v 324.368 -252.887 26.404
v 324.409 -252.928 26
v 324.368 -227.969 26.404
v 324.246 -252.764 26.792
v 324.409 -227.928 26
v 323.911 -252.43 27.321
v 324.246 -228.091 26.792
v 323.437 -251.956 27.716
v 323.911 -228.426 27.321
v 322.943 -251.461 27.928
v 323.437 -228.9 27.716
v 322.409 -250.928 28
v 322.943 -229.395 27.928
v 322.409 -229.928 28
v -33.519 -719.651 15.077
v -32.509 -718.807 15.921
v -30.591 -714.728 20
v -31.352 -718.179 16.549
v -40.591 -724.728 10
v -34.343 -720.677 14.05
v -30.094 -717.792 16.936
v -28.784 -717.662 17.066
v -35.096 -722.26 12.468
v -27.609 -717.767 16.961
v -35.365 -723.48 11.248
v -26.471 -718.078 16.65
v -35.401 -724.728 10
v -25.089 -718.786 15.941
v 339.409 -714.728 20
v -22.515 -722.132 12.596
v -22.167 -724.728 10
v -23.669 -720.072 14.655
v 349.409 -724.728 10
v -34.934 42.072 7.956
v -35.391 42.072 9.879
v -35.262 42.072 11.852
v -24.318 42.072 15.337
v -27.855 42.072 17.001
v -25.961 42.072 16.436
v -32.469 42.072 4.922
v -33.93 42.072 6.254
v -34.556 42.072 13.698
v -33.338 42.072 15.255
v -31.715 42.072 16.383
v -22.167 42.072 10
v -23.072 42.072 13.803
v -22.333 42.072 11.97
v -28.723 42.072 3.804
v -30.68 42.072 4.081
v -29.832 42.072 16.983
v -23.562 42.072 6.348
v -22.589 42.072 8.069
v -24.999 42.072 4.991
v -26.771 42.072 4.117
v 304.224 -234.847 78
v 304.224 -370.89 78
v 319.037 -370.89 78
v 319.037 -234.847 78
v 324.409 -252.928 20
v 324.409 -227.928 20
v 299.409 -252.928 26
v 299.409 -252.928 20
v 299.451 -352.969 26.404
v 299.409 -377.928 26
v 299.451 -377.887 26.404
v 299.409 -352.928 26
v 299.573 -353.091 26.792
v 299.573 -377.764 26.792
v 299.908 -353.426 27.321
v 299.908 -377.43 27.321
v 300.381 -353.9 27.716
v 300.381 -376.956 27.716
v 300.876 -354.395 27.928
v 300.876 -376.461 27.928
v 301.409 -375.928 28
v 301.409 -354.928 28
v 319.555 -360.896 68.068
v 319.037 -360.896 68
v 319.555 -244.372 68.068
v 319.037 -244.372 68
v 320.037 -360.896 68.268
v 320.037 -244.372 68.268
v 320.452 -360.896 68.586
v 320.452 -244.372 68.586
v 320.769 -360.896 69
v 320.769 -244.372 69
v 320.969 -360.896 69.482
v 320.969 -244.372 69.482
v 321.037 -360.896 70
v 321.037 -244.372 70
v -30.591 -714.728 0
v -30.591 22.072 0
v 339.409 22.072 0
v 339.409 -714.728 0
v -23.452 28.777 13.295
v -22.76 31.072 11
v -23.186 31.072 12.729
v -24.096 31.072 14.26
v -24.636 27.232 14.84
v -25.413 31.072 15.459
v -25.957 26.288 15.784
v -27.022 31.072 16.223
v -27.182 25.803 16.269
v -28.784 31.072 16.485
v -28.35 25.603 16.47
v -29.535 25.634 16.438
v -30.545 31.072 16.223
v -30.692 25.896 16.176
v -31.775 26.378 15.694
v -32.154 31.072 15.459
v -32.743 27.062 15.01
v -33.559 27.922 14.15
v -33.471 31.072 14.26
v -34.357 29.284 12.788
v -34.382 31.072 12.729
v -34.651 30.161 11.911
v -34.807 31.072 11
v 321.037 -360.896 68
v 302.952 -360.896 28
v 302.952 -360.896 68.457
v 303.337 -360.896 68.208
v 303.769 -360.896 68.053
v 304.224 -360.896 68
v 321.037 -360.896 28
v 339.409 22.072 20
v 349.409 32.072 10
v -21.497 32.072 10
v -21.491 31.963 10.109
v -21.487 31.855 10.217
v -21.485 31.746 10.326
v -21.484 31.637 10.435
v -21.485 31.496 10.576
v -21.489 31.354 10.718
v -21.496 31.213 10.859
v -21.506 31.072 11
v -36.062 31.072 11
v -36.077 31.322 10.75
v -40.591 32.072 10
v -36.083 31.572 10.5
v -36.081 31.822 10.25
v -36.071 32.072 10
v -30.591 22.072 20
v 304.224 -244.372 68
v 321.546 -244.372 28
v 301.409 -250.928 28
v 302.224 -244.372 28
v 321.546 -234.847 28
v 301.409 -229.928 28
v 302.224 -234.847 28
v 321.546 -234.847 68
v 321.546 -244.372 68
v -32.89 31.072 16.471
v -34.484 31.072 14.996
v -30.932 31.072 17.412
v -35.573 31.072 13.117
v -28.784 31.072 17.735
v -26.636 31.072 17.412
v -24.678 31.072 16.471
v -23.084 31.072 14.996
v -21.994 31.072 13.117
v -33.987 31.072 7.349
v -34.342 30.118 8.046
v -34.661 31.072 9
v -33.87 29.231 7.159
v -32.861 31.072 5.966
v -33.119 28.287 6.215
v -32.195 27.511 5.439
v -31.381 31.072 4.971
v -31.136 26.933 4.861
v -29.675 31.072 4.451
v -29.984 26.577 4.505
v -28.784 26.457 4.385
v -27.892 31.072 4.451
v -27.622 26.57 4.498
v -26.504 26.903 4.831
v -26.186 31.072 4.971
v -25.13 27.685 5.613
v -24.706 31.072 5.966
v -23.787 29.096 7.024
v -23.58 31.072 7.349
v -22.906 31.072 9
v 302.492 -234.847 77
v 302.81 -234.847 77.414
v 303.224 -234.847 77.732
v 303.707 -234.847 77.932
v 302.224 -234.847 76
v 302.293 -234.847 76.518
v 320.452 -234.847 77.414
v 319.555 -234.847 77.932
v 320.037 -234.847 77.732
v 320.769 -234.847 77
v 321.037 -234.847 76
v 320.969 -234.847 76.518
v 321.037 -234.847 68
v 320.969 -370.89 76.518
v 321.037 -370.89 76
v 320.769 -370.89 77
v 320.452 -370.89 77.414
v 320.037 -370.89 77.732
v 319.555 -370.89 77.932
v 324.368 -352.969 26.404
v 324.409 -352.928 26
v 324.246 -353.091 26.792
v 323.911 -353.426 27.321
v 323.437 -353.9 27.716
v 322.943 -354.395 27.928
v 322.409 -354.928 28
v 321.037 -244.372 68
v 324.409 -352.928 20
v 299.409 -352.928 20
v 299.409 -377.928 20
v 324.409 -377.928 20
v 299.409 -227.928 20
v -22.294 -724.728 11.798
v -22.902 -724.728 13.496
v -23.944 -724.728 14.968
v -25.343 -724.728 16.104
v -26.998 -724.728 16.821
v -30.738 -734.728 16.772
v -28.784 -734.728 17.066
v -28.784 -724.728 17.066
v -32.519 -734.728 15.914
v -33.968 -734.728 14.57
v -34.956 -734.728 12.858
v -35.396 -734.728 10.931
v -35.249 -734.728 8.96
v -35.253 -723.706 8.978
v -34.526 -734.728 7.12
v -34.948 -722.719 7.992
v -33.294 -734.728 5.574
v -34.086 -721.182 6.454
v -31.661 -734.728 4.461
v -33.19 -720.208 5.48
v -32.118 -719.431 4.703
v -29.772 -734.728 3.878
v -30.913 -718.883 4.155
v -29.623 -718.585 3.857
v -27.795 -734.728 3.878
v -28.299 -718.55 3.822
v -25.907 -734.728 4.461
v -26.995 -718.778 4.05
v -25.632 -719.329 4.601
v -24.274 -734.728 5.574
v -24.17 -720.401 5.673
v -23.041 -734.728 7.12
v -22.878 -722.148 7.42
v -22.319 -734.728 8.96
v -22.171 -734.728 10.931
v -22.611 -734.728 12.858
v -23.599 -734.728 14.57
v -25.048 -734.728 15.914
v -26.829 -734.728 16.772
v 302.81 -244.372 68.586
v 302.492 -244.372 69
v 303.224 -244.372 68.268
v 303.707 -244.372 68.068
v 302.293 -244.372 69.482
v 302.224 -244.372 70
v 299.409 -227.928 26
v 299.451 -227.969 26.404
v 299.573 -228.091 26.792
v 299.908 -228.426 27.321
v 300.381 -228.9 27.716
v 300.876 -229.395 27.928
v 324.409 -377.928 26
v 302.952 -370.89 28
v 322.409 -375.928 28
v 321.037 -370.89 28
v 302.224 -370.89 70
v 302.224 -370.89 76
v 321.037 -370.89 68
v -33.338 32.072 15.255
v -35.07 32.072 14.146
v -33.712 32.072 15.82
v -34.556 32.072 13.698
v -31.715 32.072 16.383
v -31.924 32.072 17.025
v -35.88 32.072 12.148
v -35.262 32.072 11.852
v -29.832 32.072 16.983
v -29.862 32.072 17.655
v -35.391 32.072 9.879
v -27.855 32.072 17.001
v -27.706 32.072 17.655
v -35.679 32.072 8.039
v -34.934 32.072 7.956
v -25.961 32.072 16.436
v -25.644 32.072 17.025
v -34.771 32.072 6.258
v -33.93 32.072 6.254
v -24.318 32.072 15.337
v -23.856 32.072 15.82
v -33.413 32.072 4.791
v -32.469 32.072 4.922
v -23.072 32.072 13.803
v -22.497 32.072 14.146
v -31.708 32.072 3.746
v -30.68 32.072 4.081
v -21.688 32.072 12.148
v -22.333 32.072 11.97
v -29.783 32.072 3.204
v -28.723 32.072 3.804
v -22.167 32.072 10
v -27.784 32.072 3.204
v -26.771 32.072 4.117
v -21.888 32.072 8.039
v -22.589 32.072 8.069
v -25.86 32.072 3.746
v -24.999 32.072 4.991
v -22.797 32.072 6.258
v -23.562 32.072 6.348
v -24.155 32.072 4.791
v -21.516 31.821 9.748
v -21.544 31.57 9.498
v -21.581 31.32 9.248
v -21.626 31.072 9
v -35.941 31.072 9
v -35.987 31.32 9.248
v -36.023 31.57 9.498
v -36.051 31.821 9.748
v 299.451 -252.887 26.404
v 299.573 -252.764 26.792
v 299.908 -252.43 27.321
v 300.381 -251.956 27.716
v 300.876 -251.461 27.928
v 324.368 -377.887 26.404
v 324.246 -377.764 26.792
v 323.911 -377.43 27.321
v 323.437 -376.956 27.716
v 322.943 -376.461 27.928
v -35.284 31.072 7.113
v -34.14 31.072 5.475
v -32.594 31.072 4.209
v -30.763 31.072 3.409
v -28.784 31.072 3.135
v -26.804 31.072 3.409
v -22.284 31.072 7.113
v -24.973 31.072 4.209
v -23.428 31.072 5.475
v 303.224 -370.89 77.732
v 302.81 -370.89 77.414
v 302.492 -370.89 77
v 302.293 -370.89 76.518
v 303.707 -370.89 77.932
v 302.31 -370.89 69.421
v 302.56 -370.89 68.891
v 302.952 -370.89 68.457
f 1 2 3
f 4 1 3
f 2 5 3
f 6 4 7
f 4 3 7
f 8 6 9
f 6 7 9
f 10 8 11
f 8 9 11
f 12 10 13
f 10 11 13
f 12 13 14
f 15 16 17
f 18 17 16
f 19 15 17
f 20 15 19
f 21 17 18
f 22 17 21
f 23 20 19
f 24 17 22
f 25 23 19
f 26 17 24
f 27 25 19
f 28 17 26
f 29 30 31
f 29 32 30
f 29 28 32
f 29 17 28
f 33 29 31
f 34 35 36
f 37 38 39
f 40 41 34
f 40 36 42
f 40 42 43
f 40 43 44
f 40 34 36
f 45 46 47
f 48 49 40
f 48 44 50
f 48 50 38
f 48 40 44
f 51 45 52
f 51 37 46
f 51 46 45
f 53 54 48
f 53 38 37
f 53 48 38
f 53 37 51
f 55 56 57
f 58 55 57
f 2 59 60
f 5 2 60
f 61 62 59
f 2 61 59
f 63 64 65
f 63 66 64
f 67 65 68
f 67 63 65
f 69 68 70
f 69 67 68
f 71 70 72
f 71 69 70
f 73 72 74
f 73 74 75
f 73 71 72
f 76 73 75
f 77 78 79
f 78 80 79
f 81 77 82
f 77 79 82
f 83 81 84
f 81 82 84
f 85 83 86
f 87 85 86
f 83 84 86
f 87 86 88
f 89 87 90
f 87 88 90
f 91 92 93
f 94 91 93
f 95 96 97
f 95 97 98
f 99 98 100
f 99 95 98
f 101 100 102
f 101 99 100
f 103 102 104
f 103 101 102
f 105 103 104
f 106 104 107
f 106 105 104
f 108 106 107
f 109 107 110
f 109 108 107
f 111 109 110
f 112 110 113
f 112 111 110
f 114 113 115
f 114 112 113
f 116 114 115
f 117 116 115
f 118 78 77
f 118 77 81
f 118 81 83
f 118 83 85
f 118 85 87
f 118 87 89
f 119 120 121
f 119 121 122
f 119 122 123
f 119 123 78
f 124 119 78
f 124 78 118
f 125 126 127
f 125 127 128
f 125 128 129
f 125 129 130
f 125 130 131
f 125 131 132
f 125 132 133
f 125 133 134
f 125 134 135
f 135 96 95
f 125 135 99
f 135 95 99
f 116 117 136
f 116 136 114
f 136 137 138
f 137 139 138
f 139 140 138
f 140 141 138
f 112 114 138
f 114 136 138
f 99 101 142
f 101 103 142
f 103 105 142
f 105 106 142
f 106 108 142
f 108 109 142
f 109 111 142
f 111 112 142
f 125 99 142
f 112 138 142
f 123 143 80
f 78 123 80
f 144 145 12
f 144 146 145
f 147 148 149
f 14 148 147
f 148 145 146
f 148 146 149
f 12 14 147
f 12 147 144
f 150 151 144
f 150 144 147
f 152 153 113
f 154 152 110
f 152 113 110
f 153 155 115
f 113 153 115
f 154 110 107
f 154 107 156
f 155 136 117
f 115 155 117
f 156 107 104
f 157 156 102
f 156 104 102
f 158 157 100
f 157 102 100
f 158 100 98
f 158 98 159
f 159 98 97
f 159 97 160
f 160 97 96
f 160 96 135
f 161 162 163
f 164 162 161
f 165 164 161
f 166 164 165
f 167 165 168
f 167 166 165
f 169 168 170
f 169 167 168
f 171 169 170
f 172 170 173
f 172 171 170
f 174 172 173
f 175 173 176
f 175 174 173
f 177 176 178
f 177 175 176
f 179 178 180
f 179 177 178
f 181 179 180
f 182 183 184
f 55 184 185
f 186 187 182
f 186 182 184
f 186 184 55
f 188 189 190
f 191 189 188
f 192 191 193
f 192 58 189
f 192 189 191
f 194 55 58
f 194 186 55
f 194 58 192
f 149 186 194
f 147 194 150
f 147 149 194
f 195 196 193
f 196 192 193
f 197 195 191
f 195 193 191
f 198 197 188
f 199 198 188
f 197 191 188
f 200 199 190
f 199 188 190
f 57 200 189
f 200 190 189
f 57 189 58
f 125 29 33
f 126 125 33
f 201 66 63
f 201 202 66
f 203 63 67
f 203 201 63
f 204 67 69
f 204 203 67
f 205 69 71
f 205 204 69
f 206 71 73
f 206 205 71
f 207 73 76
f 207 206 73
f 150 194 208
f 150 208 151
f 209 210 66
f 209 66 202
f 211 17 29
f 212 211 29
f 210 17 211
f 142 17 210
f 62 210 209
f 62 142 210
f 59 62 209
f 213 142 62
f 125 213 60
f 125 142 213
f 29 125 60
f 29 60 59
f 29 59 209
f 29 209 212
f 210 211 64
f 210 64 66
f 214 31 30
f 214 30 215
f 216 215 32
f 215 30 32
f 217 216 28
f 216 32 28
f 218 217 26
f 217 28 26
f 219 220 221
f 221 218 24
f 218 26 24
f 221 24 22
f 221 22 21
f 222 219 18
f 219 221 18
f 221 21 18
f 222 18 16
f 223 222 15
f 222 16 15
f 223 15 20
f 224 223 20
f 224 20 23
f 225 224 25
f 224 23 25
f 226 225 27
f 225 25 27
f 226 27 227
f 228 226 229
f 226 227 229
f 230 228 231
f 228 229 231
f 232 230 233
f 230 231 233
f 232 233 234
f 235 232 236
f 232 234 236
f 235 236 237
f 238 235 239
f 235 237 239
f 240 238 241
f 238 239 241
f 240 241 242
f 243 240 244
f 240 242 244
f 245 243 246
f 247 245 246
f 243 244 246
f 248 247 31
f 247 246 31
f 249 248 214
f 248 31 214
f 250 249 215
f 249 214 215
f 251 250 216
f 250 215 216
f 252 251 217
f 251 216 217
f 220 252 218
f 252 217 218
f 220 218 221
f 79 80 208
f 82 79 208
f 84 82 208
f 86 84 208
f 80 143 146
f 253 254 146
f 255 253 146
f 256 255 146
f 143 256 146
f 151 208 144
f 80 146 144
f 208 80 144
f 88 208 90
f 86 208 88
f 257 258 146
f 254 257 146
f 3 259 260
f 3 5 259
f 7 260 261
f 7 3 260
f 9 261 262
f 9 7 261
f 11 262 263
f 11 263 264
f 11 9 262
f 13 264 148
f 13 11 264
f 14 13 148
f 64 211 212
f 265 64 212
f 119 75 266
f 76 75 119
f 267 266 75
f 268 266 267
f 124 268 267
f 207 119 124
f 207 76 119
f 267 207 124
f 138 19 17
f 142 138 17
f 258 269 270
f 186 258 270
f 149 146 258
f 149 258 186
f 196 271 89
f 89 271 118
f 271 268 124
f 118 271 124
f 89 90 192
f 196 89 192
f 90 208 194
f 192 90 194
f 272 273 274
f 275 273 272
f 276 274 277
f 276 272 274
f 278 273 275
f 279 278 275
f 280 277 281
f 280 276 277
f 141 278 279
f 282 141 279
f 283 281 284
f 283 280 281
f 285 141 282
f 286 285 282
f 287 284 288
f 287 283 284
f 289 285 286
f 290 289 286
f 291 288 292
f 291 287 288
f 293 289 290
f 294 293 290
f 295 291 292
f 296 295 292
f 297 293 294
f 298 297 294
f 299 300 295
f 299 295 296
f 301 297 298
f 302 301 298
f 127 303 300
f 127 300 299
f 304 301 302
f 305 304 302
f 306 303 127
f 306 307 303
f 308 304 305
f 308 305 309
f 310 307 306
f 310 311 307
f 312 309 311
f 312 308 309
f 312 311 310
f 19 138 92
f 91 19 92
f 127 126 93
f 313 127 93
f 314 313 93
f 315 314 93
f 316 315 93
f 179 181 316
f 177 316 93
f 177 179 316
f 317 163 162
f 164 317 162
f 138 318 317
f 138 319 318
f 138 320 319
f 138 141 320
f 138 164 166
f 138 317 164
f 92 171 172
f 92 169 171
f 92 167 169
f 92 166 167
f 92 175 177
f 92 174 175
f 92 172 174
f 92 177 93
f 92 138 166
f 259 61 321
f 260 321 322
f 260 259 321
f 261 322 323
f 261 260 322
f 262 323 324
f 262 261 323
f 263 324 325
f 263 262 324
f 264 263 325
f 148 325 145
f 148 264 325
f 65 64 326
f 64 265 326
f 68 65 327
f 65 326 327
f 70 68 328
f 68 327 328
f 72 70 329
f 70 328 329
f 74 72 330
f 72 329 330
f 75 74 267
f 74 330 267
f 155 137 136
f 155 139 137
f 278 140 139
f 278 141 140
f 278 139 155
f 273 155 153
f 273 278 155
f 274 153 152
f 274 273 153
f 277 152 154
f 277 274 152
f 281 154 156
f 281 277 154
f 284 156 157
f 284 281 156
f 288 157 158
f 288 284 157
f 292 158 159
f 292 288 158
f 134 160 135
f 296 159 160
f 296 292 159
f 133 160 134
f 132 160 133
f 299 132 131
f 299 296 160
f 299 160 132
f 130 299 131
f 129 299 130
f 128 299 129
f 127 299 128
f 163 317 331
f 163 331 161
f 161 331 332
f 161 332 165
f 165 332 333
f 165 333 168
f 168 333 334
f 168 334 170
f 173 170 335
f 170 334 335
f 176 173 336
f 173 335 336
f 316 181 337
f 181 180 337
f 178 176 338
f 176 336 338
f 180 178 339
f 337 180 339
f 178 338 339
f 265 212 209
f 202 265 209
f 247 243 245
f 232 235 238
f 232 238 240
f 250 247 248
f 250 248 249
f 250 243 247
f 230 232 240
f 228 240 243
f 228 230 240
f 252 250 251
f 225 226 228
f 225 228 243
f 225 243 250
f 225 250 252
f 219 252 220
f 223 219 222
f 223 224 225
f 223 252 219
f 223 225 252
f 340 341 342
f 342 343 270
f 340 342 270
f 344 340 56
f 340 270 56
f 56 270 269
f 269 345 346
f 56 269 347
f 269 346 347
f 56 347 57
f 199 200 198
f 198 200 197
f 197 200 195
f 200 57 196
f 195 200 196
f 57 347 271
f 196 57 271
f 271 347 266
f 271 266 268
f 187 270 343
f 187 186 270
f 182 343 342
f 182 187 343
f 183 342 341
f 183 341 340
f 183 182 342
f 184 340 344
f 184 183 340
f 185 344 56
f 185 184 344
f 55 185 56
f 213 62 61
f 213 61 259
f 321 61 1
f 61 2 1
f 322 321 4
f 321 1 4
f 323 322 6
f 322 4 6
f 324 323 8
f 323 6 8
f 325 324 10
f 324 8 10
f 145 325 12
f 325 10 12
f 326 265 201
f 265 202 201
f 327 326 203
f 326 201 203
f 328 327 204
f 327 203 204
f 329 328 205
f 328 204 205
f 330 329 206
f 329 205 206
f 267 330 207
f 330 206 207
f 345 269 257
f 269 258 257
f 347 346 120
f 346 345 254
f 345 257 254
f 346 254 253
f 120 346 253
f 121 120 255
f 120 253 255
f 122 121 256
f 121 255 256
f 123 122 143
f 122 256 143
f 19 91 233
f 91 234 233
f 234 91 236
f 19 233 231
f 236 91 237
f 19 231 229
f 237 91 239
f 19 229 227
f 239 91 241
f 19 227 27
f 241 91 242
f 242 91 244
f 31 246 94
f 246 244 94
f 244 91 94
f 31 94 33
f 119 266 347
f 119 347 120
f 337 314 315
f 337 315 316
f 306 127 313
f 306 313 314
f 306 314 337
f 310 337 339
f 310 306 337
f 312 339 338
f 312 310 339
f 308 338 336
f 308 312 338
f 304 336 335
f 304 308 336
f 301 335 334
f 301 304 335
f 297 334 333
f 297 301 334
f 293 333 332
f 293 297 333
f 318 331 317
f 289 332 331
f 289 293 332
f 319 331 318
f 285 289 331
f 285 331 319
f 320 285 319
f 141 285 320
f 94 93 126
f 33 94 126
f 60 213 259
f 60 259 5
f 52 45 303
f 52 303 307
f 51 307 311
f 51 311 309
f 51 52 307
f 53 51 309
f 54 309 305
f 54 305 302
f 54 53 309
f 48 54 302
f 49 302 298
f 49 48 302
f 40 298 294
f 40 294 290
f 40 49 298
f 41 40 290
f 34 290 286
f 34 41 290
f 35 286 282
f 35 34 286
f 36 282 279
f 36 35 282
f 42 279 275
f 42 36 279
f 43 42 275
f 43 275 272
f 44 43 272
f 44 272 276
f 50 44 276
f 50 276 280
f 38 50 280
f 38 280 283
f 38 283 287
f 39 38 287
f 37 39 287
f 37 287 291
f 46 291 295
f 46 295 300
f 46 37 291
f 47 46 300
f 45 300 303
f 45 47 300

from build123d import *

# Parameters (mm, degrees)
SKETCH1_W            = 390
SKETCH1_H            = 756.8
BOSS_EXTRUDE1_DEPTH  = 20
SKETCH2_R            = 6.05
BOSS_EXTRUDE2_DEPTH  = 10
SKETCH3_R            = 6.631048811
BOSS_EXTRUDE3_DEPTH  = 10
CHAMFER1_SIZE        = 10
BOSS_EXTRUDE5_DEPTH  = 50
SKETCH5_W            = 30
SKETCH5_H            = 160
CUT_EXTRUDE1_DEPTH   = 50
CHAMFER2_SIZE        = 10
CUT_EXTRUDE2_DEPTH   = 121
SKETCH10_W           = 25
SKETCH10_H           = 25
BOSS_EXTRUDE7_DEPTH  = 8
SKETCH15_W           = 19.321199796
SKETCH15_H           = 9.52453511
BOSS_EXTRUDE8_DEPTH  = 40
SKETCH16_W           = 18.085272723
SKETCH16_H           = 9.99449282
BOSS_EXTRUDE9_DEPTH  = 40
SKETCH18_W           = 18.812893718
SKETCH18_H           = 136.043392328
BOSS_EXTRUDE10_DEPTH = 10
FILLET1_R            = 2
FILLET2_R            = 2
FILLET3_R            = 2
CUT_EXTRUDE3_START   = -10
SKETCH23_R           = 6.05
CUT_EXTRUDE3_DEPTH   = 10
SKETCH24_R           = 7.299940413
BOSS_EXTRUDE11_DEPTH = 1
BOSS_EXTRUDE12_START = 10
SKETCH27_R           = 6.63104881
BOSS_EXTRUDE12_DEPTH = 10


with BuildPart() as part:
    # Sketch1 → Boss-Extrude1 (new body)
    with BuildSketch(Plane.XY):
        with Locations((154.409313495, -346.327898551)):
            Rectangle(SKETCH1_W, SKETCH1_H)
    extrude(amount=BOSS_EXTRUDE1_DEPTH)

    # Sketch2 → Boss-Extrude2 (add)
    with BuildSketch(Plane(origin=(0, 32.072101449, 0), x_dir=(1, 0, 0), z_dir=(0, 1, 0))):
        with Locations(Location((-28.78378628, -10.435138004, 0), (0, 0, 90))):
            Circle(SKETCH2_R)
    extrude(amount=BOSS_EXTRUDE2_DEPTH)

    # Sketch3 → Boss-Extrude3 (add)
    with BuildSketch(Plane.XZ.offset(724.727898551)):
        with Locations(Location((-28.78378628, 10.435138004, 0), (0, 0, 90))):
            Circle(SKETCH3_R)
    extrude(amount=BOSS_EXTRUDE3_DEPTH)

    # Chamfer1
    # the kernel refuses this chamfer: 10 mm, written as the material it takes off along each edge
    with BuildSketch(Plane(origin=(-40.590686505, -750.44472843, 20), x_dir=(-0.027495876610586317, 0, -0.9996219169112968), z_dir=(0, 1, 0)), Plane(origin=(349.409313495, 57.788931329, 0), x_dir=(-0.9996219169112968, 0, -0.027495876610586334), z_dir=(0, -1, 0))) as chamfer1_piece_1:
        Polygon((CHAMFER1_SIZE * 0.999621916911, -CHAMFER1_SIZE * 0.0274958766106), (-CHAMFER1_SIZE * 0.0274958766106, -CHAMFER1_SIZE * 0.999621916911), (0, 0), align=None)
    extrude(amount=808.233659759, mode=Mode.SUBTRACT)
    with BuildSketch(Plane(origin=(375.126143374, -724.727898551, 20), x_dir=(0, 0.9996219169112968, 0.02749587661058643), z_dir=(-1, 0, 0))) as chamfer1_piece_2_section:
        Polygon((CHAMFER1_SIZE * 0.999621916911, CHAMFER1_SIZE * 0.0274958766106), (-CHAMFER1_SIZE * 0.0274958766106, CHAMFER1_SIZE * 0.999621916911), (0, 0), align=None)
    chamfer1_piece_2 = extrude(amount=441.433659759, mode=Mode.PRIVATE)
    chamfer1_piece_2 = chamfer1_piece_2 - Plane(origin=(-28.78378628, -721.415314621, 10.435138004), x_dir=(0, 0, 1), z_dir=(0, 1, 0)) * Cylinder(6.631048811, 923, mode=Mode.PRIVATE)
    add(chamfer1_piece_2, mode=Mode.SUBTRACT)
    with BuildSketch(Plane(origin=(349.409313495, 57.788931329, 20), x_dir=(-0.9996219169112968, 0, 0.027495876610586282), z_dir=(0, -1, 0)), Plane(origin=(-40.590686505, -750.44472843, 0), x_dir=(-0.027495876610586317, 0, 0.9996219169112968), z_dir=(0, 1, 0))) as chamfer1_piece_3:
        Polygon((CHAMFER1_SIZE * 0.999621916911, CHAMFER1_SIZE * 0.0274958766106), (-CHAMFER1_SIZE * 0.0274958766106, CHAMFER1_SIZE * 0.999621916911), (0, 0), align=None)
    extrude(amount=808.233659759, mode=Mode.SUBTRACT)
    with BuildSketch(Plane(origin=(-66.307516385, 32.072101449, 20), x_dir=(0, 0.027495876610586317, -0.9996219169112968), z_dir=(1, 0, 0))) as chamfer1_piece_4_section:
        Polygon((CHAMFER1_SIZE * 0.999621916911, -CHAMFER1_SIZE * 0.0274958766106), (-CHAMFER1_SIZE * 0.0274958766106, -CHAMFER1_SIZE * 0.999621916911), (0, 0), align=None)
    chamfer1_piece_4 = extrude(amount=441.433659759, mode=Mode.PRIVATE)
    chamfer1_piece_4 = chamfer1_piece_4 - Plane(origin=(-28.78378628, 28.76135635, 10.435138004), x_dir=(0, 0, -1), z_dir=(0, -1, 0)) * Cylinder(6.05, 923, mode=Mode.PRIVATE)
    add(chamfer1_piece_4, mode=Mode.SUBTRACT)
    with BuildSketch(Plane(origin=(375.126143374, -724.727898551, 0), x_dir=(0, 0.9996219169112968, -0.027495876610586487), z_dir=(-1, 0, 0))) as chamfer1_piece_5_section:
        Polygon((CHAMFER1_SIZE * 0.999621916911, -CHAMFER1_SIZE * 0.0274958766106), (-CHAMFER1_SIZE * 0.0274958766106, -CHAMFER1_SIZE * 0.999621916911), (0, 0), align=None)
    chamfer1_piece_5 = extrude(amount=441.433659759, mode=Mode.PRIVATE)
    chamfer1_piece_5 = chamfer1_piece_5 - Plane(origin=(-28.78378628, -721.416873801, 10.435138004), x_dir=(0, 0, 1), z_dir=(0, 1, 0)) * Cylinder(6.631048811, 923, mode=Mode.PRIVATE)
    add(chamfer1_piece_5, mode=Mode.SUBTRACT)
    with BuildSketch(Plane(origin=(-66.307516385, 32.072101449, 0), x_dir=(0, 0.027495876610586317, 0.9996219169112968), z_dir=(1, 0, 0))) as chamfer1_piece_6_section:
        Polygon((CHAMFER1_SIZE * 0.999621916911, CHAMFER1_SIZE * 0.0274958766106), (-CHAMFER1_SIZE * 0.0274958766106, CHAMFER1_SIZE * 0.999621916911), (0, 0), align=None)
    chamfer1_piece_6 = extrude(amount=441.433659759, mode=Mode.PRIVATE)
    chamfer1_piece_6 = chamfer1_piece_6 - Plane(origin=(-28.78378628, 28.763199232, 10.435138004), x_dir=(0, 0, -1), z_dir=(0, -1, 0)) * Cylinder(6.05, 923, mode=Mode.PRIVATE)
    add(chamfer1_piece_6, mode=Mode.SUBTRACT)

    # Sketch4 → Boss-Extrude5 (add)
    with BuildSketch(Plane.XY.offset(20)):
        Polygon((309.409313495, -346.327898551), (309.409313495, -246.327898551), (339.409313495, -246.327898551), (339.409313495, -446.327898551), (309.409313495, -446.327898551), align=None)
    extrude(amount=BOSS_EXTRUDE5_DEPTH)

    # Sketch5 → Cut-Extrude1 (cut)
    with BuildSketch(Plane(origin=(339.409313495, 0, 0), x_dir=(0, 0, -1), z_dir=(1, 0, 0))):
        with Locations((-35, -346.327898551)):
            Rectangle(SKETCH5_W, SKETCH5_H)
    extrude(amount=-CUT_EXTRUDE1_DEPTH, mode=Mode.SUBTRACT)

    # Chamfer2
    chamfer2_edges = [part.edges().sort_by_distance(p)[0] for p in [
        (309.409313495, -346.327898551, 70),
        (309.409313495, -246.327898551, 45),
        (324.409313495, -446.327898551, 70),
        (309.409313495, -446.327898551, 45),
        (339.409313495, -446.327898551, 45),
        (324.409313495, -246.327898551, 70),
        (339.409313495, -246.327898551, 45),
        (339.409313495, -346.327898551, 70),
    ]]
    chamfer(chamfer2_edges, length=CHAMFER2_SIZE)

    # Sketch7 → Cut-Extrude2 (cut)
    with BuildSketch(Plane.XY.offset(20)):
        Polygon((309.409313495, -256.327898551), (319.409313495, -246.327898551), (329.409313495, -246.327898551), (339.409313495, -256.327898551), (339.409313495, -436.327898551), (329.409313495, -446.327898551), (319.409313495, -446.327898551), (309.409313495, -436.327898551), align=None)
    extrude(amount=CUT_EXTRUDE2_DEPTH, mode=Mode.SUBTRACT)

    # Sketch10 → Boss-Extrude7 (add)
    with BuildSketch(Plane.XY.offset(20)):
        with Locations((311.909313495, -240.427898551)):
            Rectangle(SKETCH10_W, SKETCH10_H)
        with Locations((311.909313495, -365.427898551)):
            Rectangle(SKETCH10_W, SKETCH10_H)
    extrude(amount=BOSS_EXTRUDE7_DEPTH)

    # Sketch15 → Boss-Extrude8 (add)
    with BuildSketch(Plane.XY.offset(28)):
        with Locations((311.88508976, -239.60936129)):
            Rectangle(SKETCH15_W, SKETCH15_H)
    extrude(amount=BOSS_EXTRUDE8_DEPTH)

    # Sketch16 → Boss-Extrude9 (add)
    with BuildSketch(Plane.XY.offset(28)):
        with Locations((311.994747219, -365.893239653)):
            Rectangle(SKETCH16_W, SKETCH16_H)
    extrude(amount=BOSS_EXTRUDE9_DEPTH)

    # Sketch18 → Boss-Extrude10 (add)
    with BuildSketch(Plane.XY.offset(68)):
        with Locations((311.630936721, -302.868789899)):
            Rectangle(SKETCH18_W, SKETCH18_H)
    extrude(amount=BOSS_EXTRUDE10_DEPTH)

    # Fillet1
    fillet1_edges = [part.edges().sort_by_distance(p)[0] for p in [
        (302.224489862, -307.631057454, 68),
        (321.03738358, -302.633811044, 68),
        (321.03738358, -302.868789899, 78),
        (302.224489862, -302.868789899, 78),
    ]]
    fillet(fillet1_edges, radius=FILLET1_R)

    # Fillet2
    fillet2_edges = [part.edges().sort_by_distance(p)[0] for p in [
        (299.409313495, -240.427898551, 28),
        (311.909313495, -252.927898551, 28),
        (324.409313495, -240.427898551, 28),
        (311.909313495, -227.927898551, 28),
    ]]
    fillet(fillet2_edges, radius=FILLET2_R)

    # Fillet3
    fillet3_edges = [part.edges().sort_by_distance(p)[0] for p in [
        (299.409313495, -365.427898551, 28),
        (311.909313495, -377.927898551, 28),
        (324.409313495, -365.427898551, 28),
        (311.909313495, -352.927898551, 28),
    ]]
    fillet(fillet3_edges, radius=FILLET3_R)

    # Sketch23 → Cut-Extrude3 (cut)
    with BuildSketch(Plane(origin=(0, 42.072101449, 0), x_dir=(1, 0, 0), z_dir=(0, 1, 0)).offset(CUT_EXTRUDE3_START)):
        with Locations((-28.78378628, -10.435138004)):
            Circle(SKETCH23_R)
    extrude(amount=CUT_EXTRUDE3_DEPTH, mode=Mode.SUBTRACT)

    # Sketch24 → Boss-Extrude11 (add)
    with BuildSketch(Plane(origin=(0, 32.072101449, 0), x_dir=(1, 0, 0), z_dir=(0, 1, 0))):
        with Locations((-28.78378628, -10.435138004)):
            Circle(SKETCH24_R)
    extrude(amount=-BOSS_EXTRUDE11_DEPTH)

    # Sketch27 → Boss-Extrude12 (add)
    with BuildSketch(Plane(origin=(0, 32.072101449, 0), x_dir=(1, 0, 0), z_dir=(0, 1, 0)).offset(BOSS_EXTRUDE12_START)):
        with Locations(Location((-28.78378628, -10.435138004, 0), (0, 0, 3.762526837))):
            Circle(SKETCH27_R)
    extrude(amount=-BOSS_EXTRUDE12_DEPTH)


solid = part.part
